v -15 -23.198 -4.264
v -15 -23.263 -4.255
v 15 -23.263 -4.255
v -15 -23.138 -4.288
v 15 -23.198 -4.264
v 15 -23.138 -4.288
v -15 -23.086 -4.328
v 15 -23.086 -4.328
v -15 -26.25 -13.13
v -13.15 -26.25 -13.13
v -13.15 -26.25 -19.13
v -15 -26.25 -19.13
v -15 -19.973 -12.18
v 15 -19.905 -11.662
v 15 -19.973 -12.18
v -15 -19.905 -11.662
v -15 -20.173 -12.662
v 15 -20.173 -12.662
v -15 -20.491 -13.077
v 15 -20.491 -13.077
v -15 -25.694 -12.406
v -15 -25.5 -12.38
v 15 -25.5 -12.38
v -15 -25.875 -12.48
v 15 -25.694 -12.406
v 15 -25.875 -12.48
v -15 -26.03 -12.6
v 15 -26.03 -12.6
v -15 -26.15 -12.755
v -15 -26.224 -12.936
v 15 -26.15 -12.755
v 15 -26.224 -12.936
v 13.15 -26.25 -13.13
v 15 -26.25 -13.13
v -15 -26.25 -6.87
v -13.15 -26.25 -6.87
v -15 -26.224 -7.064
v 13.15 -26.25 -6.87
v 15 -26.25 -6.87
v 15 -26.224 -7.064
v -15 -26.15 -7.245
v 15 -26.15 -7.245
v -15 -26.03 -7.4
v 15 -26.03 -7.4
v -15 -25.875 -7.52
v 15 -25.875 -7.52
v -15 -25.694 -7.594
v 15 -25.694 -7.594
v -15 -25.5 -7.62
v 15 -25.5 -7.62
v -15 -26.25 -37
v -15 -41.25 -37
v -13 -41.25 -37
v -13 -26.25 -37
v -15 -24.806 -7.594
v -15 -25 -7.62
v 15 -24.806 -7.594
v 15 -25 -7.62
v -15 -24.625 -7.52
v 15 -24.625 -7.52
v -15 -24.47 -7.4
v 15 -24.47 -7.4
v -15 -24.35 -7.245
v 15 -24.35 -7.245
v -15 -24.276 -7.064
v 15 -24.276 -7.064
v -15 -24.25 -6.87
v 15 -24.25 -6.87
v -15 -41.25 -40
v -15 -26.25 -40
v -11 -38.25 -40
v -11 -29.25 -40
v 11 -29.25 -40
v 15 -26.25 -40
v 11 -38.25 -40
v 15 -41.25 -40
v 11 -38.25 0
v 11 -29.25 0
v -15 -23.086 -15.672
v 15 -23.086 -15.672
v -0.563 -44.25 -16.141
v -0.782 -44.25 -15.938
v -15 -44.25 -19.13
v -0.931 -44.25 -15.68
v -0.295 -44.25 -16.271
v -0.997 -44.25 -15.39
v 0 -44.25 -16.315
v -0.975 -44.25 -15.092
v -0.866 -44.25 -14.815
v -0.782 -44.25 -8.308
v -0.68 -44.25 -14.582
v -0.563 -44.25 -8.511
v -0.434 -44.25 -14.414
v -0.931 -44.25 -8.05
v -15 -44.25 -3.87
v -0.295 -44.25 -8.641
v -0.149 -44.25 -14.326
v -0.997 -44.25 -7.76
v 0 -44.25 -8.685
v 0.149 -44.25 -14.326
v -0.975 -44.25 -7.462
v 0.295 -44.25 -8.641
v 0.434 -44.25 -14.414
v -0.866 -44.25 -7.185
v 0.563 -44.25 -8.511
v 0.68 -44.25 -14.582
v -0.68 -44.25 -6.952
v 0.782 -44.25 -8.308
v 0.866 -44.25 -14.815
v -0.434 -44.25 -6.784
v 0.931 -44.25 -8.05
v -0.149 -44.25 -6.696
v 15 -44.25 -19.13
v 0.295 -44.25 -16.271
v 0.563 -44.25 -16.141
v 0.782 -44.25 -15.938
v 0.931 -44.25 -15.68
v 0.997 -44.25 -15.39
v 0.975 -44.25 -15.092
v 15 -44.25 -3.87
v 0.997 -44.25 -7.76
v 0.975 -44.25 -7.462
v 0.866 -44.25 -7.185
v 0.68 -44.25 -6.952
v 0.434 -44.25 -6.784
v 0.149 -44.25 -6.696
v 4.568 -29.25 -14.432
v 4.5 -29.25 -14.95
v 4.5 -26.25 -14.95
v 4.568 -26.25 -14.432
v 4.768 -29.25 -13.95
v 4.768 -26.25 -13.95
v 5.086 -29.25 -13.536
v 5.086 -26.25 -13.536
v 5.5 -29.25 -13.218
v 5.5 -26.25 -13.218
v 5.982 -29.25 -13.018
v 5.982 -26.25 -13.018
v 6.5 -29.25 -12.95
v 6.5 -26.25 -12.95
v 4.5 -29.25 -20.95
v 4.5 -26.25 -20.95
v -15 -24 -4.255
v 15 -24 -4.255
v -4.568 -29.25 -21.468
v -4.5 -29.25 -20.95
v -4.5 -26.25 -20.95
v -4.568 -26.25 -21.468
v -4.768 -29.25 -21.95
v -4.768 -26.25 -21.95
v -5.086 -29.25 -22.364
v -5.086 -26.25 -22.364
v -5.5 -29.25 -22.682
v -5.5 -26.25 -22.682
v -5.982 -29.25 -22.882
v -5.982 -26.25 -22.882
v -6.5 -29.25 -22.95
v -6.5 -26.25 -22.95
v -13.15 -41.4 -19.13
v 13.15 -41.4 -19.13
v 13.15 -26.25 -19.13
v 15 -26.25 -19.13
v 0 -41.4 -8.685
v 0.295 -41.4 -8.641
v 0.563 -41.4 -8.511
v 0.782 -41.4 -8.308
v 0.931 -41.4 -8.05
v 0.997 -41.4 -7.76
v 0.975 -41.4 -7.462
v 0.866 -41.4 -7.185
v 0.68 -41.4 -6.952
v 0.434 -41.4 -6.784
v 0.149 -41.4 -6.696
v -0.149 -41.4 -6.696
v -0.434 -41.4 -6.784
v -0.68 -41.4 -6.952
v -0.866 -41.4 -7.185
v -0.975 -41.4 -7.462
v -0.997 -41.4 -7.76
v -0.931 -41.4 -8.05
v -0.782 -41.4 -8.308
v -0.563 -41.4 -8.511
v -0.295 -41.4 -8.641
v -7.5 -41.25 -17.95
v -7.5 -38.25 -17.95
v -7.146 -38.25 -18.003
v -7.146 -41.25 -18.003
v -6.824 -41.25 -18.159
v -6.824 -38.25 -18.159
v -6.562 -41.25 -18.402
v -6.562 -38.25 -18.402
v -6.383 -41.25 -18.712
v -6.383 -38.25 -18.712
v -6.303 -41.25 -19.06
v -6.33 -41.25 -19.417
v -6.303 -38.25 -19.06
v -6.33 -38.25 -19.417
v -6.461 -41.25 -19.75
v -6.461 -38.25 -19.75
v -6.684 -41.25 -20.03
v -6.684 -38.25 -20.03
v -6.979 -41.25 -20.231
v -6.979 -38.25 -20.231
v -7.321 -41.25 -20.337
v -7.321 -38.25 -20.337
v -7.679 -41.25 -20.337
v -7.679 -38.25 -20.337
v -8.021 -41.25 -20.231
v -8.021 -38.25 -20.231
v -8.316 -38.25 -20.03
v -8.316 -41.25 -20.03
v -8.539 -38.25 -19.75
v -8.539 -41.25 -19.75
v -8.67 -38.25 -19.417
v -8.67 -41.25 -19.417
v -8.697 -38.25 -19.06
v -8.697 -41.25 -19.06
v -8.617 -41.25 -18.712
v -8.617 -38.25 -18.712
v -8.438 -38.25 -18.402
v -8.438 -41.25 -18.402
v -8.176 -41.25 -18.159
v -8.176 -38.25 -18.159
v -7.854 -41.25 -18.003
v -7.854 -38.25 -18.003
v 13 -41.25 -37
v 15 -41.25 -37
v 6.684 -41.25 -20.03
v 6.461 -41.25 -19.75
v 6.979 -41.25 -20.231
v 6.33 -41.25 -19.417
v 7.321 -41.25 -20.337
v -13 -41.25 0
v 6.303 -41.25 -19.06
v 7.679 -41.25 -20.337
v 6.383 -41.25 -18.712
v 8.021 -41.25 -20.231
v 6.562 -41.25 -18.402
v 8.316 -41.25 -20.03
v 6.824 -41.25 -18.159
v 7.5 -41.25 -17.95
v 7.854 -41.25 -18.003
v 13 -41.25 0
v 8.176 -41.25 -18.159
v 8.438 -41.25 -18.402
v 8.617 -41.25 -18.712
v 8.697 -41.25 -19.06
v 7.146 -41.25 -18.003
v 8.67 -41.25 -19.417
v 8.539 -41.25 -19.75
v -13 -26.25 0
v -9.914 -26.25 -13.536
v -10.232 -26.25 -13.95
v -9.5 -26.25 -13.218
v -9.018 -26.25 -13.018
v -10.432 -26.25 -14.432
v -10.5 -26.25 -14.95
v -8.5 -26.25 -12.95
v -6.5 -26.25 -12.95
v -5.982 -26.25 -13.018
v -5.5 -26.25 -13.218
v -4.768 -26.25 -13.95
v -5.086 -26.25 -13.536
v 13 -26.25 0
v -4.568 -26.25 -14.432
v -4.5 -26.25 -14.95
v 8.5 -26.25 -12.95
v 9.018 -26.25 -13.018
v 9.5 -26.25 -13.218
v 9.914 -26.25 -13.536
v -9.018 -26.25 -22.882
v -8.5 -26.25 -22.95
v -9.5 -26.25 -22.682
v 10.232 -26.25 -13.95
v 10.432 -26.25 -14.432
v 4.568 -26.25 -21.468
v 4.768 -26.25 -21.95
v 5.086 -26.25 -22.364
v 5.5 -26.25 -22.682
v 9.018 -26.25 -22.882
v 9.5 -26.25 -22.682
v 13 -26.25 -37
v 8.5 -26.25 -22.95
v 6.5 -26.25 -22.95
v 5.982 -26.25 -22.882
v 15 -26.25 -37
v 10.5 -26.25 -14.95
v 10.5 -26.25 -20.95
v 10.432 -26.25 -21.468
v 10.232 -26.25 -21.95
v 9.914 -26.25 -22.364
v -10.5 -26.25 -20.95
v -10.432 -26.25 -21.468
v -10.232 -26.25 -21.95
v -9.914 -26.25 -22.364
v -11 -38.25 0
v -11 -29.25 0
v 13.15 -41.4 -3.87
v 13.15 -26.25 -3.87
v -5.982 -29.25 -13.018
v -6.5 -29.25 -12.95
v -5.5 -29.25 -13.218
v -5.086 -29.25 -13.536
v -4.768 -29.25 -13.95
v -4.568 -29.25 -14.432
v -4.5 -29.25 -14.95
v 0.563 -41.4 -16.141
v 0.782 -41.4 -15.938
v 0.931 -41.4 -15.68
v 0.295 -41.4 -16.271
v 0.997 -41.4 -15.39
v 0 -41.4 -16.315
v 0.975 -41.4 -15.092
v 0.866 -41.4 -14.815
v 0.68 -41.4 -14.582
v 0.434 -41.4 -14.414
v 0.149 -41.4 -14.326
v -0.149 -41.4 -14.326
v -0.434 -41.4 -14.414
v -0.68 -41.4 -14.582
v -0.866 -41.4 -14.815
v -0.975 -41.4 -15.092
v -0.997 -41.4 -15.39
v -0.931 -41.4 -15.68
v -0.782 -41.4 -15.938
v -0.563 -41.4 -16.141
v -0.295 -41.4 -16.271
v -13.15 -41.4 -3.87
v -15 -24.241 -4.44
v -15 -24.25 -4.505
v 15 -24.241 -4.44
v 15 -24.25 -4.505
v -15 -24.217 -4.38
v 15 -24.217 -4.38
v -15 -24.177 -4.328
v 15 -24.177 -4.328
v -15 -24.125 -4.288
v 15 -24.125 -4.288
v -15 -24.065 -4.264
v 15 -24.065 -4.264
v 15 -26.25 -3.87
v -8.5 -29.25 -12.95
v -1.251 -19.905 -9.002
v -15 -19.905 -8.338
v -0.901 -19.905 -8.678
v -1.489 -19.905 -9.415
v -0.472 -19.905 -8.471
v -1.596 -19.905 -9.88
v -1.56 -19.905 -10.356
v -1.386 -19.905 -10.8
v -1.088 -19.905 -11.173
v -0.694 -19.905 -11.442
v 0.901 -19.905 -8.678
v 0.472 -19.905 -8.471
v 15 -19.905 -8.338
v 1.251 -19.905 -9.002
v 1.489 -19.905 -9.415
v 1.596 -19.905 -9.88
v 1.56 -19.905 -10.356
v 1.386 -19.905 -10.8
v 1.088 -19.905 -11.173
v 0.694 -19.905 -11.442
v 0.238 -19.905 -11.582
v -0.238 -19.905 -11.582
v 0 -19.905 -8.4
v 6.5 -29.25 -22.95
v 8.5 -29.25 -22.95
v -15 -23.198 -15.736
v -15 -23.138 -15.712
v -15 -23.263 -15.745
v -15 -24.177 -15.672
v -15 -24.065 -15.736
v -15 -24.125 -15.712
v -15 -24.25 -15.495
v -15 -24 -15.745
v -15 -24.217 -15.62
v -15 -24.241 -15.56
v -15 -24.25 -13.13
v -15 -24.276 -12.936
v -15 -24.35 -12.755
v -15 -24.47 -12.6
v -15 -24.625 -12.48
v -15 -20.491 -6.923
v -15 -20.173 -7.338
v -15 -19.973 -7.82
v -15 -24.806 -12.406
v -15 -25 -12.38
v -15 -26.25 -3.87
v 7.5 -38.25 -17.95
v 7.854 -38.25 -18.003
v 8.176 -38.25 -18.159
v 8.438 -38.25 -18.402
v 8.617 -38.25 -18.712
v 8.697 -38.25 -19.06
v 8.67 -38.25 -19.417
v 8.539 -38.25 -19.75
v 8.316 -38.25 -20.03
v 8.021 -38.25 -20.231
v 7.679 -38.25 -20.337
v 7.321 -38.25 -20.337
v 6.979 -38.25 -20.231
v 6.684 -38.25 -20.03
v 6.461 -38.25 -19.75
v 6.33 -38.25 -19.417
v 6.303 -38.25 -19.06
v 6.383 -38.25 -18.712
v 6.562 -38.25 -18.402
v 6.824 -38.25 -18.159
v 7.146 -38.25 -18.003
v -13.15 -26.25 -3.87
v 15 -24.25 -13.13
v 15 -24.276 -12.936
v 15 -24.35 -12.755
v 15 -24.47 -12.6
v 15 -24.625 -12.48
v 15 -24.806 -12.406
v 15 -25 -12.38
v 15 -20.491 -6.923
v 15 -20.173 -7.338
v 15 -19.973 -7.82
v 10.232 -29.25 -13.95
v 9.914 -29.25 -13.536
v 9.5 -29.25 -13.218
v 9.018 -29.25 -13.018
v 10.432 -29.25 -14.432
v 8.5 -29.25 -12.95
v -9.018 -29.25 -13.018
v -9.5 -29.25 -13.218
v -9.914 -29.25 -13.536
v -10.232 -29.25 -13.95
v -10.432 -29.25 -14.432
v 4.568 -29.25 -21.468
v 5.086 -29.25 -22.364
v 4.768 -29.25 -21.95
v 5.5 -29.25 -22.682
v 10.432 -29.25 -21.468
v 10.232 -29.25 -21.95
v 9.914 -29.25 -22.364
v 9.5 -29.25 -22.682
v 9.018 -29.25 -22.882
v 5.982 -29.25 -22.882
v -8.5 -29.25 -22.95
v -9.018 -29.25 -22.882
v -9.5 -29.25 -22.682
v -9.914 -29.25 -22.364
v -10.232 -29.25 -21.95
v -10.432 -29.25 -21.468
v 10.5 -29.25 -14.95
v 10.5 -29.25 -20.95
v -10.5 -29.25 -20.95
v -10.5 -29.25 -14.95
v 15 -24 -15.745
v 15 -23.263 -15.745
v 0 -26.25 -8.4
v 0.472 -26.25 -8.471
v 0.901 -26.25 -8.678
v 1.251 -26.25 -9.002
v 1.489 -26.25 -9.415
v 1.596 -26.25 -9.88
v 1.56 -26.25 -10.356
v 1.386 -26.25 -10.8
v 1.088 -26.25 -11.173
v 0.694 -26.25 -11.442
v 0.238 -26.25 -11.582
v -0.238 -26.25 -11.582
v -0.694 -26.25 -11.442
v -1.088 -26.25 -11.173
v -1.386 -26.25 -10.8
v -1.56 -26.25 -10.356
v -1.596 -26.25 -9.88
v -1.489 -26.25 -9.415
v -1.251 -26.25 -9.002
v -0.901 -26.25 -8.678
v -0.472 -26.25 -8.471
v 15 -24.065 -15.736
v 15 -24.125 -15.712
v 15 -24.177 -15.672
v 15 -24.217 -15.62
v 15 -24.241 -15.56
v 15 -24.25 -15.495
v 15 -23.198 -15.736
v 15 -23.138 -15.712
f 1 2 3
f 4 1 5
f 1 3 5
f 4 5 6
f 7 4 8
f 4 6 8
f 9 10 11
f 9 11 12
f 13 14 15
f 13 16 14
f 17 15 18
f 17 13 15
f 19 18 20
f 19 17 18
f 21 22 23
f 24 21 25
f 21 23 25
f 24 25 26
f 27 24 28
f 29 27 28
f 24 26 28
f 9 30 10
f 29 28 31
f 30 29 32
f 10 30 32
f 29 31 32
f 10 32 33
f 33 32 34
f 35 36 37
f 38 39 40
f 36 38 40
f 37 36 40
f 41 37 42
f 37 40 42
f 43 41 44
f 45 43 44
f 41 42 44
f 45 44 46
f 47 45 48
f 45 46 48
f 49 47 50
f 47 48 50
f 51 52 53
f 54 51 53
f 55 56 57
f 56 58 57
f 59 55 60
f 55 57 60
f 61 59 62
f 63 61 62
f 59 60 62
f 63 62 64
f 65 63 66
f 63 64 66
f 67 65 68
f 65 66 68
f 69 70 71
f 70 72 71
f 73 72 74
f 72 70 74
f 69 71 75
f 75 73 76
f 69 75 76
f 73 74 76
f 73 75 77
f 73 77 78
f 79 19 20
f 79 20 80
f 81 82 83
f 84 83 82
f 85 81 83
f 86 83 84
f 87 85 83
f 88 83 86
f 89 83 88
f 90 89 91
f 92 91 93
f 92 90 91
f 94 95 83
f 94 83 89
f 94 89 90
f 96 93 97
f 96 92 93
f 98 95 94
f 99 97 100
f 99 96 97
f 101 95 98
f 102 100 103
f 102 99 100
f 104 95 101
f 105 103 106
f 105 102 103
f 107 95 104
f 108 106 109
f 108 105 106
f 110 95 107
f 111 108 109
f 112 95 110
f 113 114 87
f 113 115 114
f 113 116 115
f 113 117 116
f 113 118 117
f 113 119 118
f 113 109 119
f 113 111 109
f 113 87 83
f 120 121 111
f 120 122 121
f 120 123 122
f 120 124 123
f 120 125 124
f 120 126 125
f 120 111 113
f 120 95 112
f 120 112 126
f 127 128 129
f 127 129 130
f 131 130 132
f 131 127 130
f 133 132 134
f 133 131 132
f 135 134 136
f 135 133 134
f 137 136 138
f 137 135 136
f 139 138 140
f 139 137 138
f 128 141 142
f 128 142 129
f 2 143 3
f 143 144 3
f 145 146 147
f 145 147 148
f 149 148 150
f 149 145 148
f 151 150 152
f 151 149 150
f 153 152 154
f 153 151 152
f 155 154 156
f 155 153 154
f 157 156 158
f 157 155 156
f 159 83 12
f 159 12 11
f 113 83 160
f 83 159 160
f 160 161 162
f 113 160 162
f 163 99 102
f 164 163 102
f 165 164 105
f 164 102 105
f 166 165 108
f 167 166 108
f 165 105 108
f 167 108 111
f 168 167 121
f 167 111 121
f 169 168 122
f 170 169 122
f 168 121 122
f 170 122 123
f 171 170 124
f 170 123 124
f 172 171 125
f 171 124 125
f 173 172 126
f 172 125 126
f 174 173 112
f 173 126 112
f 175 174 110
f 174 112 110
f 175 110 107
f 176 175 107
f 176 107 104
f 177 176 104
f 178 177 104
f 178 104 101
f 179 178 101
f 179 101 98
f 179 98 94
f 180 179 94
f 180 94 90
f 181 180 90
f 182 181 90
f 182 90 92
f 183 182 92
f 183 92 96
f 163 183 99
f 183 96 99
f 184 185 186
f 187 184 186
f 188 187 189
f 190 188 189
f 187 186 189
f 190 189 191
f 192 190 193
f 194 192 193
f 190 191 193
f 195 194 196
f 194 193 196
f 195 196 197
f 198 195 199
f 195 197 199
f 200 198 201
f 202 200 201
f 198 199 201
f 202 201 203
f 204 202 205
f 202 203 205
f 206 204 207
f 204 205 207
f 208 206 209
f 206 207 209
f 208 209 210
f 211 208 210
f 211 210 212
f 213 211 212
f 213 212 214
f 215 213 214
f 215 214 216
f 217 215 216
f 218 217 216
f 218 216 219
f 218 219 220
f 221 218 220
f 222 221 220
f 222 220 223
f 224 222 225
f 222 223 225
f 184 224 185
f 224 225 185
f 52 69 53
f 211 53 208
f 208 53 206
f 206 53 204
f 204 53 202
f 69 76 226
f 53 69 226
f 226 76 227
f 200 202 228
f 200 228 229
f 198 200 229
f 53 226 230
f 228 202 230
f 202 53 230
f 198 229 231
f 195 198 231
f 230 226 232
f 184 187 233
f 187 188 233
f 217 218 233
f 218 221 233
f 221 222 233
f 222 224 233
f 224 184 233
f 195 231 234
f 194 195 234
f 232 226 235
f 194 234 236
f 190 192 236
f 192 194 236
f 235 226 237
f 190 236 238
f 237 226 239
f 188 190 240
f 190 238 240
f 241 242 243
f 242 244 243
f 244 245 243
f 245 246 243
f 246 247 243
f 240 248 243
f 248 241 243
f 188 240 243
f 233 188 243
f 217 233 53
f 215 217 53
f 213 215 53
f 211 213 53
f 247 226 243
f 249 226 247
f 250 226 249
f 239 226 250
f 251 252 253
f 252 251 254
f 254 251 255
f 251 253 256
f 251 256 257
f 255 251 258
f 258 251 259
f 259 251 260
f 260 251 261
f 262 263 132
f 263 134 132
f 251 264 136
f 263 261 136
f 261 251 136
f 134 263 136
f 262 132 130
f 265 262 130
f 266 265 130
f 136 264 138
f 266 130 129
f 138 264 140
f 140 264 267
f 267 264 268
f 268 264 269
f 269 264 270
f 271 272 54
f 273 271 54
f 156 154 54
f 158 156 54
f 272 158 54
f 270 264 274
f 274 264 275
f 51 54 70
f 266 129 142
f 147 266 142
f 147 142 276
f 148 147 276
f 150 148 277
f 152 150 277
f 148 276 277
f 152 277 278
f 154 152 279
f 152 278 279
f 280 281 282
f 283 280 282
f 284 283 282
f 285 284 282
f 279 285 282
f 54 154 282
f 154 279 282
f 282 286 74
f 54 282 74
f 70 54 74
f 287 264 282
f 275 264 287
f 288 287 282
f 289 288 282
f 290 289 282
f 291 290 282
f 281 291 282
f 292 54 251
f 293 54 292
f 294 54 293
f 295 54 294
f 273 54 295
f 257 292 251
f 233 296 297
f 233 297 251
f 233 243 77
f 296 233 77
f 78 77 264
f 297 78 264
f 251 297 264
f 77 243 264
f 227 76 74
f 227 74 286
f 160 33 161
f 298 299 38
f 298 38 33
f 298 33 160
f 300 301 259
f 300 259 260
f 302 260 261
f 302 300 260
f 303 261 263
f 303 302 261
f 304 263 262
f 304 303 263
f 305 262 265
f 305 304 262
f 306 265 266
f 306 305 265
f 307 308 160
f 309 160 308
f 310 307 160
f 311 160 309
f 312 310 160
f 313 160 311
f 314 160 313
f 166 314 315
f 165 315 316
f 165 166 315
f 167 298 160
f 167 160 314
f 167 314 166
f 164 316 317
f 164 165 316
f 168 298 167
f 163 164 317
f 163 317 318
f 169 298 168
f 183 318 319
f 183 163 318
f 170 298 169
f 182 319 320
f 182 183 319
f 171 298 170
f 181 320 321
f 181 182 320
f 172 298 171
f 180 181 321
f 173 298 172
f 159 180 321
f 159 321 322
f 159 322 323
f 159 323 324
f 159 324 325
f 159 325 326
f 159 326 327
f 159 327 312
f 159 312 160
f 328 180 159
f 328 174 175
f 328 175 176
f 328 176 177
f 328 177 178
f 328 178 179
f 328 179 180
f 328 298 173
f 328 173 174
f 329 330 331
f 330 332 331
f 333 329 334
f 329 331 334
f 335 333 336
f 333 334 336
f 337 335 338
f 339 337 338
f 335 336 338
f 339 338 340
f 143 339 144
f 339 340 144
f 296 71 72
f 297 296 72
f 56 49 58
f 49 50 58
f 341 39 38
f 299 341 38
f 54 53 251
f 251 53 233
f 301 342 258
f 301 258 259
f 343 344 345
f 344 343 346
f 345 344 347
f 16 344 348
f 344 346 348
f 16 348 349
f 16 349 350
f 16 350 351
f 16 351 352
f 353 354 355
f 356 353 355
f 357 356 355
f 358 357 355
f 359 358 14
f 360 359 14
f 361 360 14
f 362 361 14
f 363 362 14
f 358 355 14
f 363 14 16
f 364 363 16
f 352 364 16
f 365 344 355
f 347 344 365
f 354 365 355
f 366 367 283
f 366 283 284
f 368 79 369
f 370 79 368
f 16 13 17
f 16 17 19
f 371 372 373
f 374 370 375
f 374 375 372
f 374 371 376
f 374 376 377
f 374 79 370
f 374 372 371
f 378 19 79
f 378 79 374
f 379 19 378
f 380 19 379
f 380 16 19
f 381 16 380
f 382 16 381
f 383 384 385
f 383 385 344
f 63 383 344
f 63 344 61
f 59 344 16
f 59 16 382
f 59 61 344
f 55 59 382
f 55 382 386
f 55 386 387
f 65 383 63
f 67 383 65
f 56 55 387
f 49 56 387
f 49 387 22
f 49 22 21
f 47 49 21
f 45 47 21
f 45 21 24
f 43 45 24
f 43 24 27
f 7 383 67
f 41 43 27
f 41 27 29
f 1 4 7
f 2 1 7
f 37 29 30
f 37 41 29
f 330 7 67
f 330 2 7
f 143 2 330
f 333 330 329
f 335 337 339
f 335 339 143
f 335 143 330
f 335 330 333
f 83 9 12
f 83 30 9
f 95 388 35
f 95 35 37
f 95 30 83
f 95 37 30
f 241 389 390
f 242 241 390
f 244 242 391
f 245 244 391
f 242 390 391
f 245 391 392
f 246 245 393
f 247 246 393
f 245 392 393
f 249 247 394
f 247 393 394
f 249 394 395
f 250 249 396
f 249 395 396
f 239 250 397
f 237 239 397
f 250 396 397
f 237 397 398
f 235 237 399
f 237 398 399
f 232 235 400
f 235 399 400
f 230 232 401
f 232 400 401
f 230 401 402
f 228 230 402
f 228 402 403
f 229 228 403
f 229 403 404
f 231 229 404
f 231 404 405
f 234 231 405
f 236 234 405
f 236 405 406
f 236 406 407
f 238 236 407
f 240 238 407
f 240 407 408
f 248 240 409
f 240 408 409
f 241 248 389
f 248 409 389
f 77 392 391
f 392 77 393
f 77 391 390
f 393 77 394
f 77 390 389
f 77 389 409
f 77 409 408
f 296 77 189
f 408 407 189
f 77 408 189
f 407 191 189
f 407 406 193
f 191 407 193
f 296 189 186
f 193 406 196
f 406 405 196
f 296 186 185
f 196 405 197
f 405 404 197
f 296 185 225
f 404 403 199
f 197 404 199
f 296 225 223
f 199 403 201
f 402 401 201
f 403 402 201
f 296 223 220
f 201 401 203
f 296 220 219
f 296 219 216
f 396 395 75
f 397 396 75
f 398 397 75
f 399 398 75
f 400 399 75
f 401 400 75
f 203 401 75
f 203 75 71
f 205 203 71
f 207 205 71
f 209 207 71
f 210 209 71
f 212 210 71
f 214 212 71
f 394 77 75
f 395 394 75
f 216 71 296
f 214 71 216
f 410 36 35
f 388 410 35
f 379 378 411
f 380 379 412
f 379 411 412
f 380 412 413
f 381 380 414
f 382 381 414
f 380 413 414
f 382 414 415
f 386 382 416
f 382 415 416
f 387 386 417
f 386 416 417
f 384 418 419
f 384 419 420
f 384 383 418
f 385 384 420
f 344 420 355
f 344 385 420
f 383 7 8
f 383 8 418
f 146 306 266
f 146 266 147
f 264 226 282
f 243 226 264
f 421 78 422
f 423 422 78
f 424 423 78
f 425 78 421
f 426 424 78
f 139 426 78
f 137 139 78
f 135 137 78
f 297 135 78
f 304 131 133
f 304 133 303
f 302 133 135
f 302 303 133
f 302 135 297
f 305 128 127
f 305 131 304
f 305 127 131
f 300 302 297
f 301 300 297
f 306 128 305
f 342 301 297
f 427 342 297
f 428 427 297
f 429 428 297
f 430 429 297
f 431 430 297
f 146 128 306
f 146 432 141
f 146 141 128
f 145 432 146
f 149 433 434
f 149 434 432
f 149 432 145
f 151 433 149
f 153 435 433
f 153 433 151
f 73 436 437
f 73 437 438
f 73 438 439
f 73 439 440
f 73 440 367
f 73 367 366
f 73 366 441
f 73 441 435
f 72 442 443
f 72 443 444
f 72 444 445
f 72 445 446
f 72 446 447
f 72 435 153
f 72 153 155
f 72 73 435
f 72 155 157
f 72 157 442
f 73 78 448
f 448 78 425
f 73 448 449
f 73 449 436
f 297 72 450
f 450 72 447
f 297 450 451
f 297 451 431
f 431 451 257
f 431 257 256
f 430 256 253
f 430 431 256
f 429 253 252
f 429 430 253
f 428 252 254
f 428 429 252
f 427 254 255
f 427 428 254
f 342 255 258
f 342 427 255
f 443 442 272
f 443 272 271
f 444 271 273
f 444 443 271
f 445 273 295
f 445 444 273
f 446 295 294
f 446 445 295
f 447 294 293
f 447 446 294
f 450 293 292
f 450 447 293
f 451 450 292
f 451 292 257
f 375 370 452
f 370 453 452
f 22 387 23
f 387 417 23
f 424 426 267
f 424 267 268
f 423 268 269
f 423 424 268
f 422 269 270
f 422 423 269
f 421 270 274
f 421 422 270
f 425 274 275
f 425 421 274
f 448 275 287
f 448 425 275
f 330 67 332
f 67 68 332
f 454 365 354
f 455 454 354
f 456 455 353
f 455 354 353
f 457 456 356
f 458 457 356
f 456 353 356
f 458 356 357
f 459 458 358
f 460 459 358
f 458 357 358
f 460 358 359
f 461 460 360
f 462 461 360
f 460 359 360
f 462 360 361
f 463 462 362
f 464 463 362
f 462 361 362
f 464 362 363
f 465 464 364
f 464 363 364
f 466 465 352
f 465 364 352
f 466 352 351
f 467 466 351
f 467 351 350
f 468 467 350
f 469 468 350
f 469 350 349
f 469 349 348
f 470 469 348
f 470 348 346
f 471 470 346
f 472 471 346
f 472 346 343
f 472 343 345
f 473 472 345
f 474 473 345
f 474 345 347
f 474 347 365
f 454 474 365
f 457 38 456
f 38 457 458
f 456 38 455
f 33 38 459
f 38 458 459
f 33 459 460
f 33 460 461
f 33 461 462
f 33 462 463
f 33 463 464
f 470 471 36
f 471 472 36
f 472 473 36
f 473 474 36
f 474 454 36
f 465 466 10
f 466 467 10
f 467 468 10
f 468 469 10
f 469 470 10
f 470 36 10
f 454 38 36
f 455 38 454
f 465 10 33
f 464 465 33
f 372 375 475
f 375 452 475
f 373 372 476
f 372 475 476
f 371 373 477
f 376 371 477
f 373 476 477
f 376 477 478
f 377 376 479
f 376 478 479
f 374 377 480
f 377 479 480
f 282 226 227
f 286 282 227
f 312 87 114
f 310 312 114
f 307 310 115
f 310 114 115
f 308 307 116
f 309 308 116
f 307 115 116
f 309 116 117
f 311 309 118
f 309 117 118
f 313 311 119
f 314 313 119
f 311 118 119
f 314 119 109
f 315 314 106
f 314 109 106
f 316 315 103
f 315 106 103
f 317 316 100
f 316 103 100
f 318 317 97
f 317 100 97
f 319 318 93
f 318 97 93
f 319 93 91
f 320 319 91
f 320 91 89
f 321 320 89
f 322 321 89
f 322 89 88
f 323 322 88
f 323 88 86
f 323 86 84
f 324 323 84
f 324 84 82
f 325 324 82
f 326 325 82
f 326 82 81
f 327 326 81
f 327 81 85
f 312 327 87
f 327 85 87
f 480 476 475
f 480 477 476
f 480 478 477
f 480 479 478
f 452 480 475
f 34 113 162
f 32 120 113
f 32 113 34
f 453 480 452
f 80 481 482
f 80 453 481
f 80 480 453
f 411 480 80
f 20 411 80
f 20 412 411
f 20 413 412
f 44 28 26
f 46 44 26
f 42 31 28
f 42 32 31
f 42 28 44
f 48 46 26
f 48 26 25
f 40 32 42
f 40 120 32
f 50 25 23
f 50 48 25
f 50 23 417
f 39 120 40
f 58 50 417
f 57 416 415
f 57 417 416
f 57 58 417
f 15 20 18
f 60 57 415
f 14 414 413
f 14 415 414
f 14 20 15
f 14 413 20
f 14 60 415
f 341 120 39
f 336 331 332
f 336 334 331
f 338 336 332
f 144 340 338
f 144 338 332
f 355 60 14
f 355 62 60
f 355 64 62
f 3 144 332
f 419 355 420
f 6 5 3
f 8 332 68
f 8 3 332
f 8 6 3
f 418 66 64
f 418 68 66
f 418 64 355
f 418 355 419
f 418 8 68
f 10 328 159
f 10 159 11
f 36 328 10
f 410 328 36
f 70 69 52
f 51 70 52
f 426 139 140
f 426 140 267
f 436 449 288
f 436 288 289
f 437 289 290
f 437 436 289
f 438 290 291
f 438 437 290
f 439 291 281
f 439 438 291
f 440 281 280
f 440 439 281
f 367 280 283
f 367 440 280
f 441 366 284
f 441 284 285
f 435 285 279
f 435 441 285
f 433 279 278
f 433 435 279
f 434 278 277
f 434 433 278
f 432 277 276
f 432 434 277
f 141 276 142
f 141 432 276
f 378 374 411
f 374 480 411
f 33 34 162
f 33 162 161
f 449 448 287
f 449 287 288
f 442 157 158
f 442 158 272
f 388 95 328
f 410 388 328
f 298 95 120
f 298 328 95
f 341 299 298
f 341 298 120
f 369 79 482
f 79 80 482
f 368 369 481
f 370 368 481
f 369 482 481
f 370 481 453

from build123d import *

# Parameters (mm, degrees)
BOSS_EXTRUDE1_DEPTH    = 15
SKETCH2_W              = 22
SKETCH2_H              = 9
CUT_EXTRUDE1_DEPTH     = 60.384867601
SKETCH4_R              = 1.2
CUT_EXTRUDE3_DEPTH     = 3
FILLET1_R              = 2
SPLIT1_SURFACE_1_BACK  = 55.366
SPLIT1_SURFACE_1_DEPTH = 110.732
SPLIT1_SURFACE_2_BACK  = 55.366
SPLIT1_SURFACE_2_DEPTH = 110.732
CUT_EXTRUDE2_START     = -29.25
CUT_EXTRUDE2_DEPTH     = 3
SKETCH6_R              = 1.6
CUT_EXTRUDE4_DEPTH     = 48.755722432
SKETCH10_W             = 2
SKETCH10_H             = 37
CUT_EXTRUDE6_DEPTH     = 15
BOSS_EXTRUDE2_START    = -6.87
BOSS_EXTRUDE2_DEPTH    = 6.26
BOSS_EXTRUDE4_DEPTH    = 3
BOSS_EXTRUDE5_START    = -6.26
BOSS_EXTRUDE5_DEPTH    = 6
SKETCH12_R             = 1
CUT_EXTRUDE7_DEPTH     = 2.85


with BuildPart() as part:
    # Sketch1 → Boss-Extrude1 (new, symmetric)
    with BuildSketch(Plane(origin=(0, 0, 0), x_dir=(0, 0, -1), z_dir=(1, 0, 0))):
        with BuildLine():
            Line((19.5, -26.25), (40, -26.25))
            Line((40, -26.25), (40, -41.25))
            Line((40, -41.25), (0, -41.25))
            Line((0, -41.25), (0, -26.25))
            Line((0, -26.25), (0.5, -26.25))
            Line((0.5, -26.25), (6.87, -26.25))
            ThreePointArc((6.87, -26.25), (7.400330086, -26.030330086), (7.62, -25.5))
            Line((7.62, -25.5), (7.62, -25))
            ThreePointArc((7.62, -25), (7.400330086, -24.469669914), (6.87, -24.25))
            Line((6.87, -24.25), (4.505, -24.25))
            ThreePointArc((4.505, -24.25), (4.328223305, -24.176776695), (4.255, -24))
            Line((4.255, -24), (4.255, -23.262766953))
            ThreePointArc((4.255, -23.262766953), (4.274030117, -23.167096095), (4.328223305, -23.085990258))
            Line((4.328223305, -23.085990258), (7.509213562, -19.905))
            Line((7.509213562, -19.905), (12.490786438, -19.905))
            Line((12.490786438, -19.905), (15.671776695, -23.085990258))
            ThreePointArc((15.671776695, -23.085990258), (15.725969883, -23.167096095), (15.745, -23.262766953))
            Line((15.745, -23.262766953), (15.745, -24))
            ThreePointArc((15.745, -24), (15.671776695, -24.176776695), (15.495, -24.25))
            Line((15.495, -24.25), (13.13, -24.25))
            ThreePointArc((13.13, -24.25), (12.599669914, -24.469669914), (12.38, -25))
            Line((12.38, -25), (12.38, -25.5))
            ThreePointArc((12.38, -25.5), (12.599669914, -26.030330086), (13.13, -26.25))
            Line((13.13, -26.25), (19.5, -26.25))
        make_face()
    extrude(amount=BOSS_EXTRUDE1_DEPTH, both=True)

    # Sketch2 → Cut-Extrude1 (cut, through all)
    with BuildSketch(Plane(origin=(0, 0, -40), x_dir=(-1, 0, 0), z_dir=(0, 0, -1))):
        with Locations((0, -33.75)):
            Rectangle(SKETCH2_W, SKETCH2_H)
    extrude(amount=-CUT_EXTRUDE1_DEPTH, mode=Mode.SUBTRACT)

    # Sketch4 → Cut-Extrude3 (cut)
    with BuildSketch(Plane(origin=(0, -38.25, 0), x_dir=(1, 0, 0), z_dir=(0, 1, 0))):
        with Locations(Location((-7.5, 19.15, 0), (0, 0, 270))):
            Circle(SKETCH4_R)
        with Locations(Location((7.5, 19.15, 0), (0, 0, 270))):
            Circle(SKETCH4_R)
    extrude(amount=-CUT_EXTRUDE3_DEPTH, mode=Mode.SUBTRACT)

    # Fillet1
    fillet1_edges = [part.edges().sort_by_distance(p)[0] for p in [
        (0, -19.905, -7.509213562),
        (0, -19.905, -12.490786438),
    ]]
    fillet(fillet1_edges, radius=FILLET1_R)


with BuildPart() as body_2:
    # Split1: the piece behind the surface
    add(part.part)
    # Split1 surface: a surface, the sketch's curves swept straight by 110.732 mm
    with BuildLine(Plane(origin=(15, 0, 0), x_dir=(0, 0, -1), z_dir=(1, 0, 0)).offset(-SPLIT1_SURFACE_1_BACK), mode=Mode.PRIVATE) as split1_surface_1_path:
        Line((0, -26.25), (40, -26.25))
    split1_surface_1 = Shell.extrude(split1_surface_1_path.wire(), (1 * SPLIT1_SURFACE_1_DEPTH, 0 * SPLIT1_SURFACE_1_DEPTH, 0 * SPLIT1_SURFACE_1_DEPTH))
    split(bisect_by=split1_surface_1, keep=Keep.BOTTOM)

    # Sketch3 → Cut-Extrude2 (cut)
    with BuildSketch(Plane(origin=(0, 0, 0), x_dir=(1, 0, 0), z_dir=(0, 1, 0)).offset(CUT_EXTRUDE2_START)):
        with BuildLine():
            Line((-10.5, 20.95), (-10.5, 14.95))
            ThreePointArc((-10.5, 14.95), (-9.914213562, 13.535786438), (-8.5, 12.95))
            Line((-8.5, 12.95), (-6.5, 12.95))
            ThreePointArc((-6.5, 12.95), (-5.085786438, 13.535786438), (-4.5, 14.95))
            Line((-4.5, 14.95), (-4.5, 20.95))
            ThreePointArc((-4.5, 20.95), (-5.085786438, 22.364213562), (-6.5, 22.95))
            Line((-6.5, 22.95), (-8.5, 22.95))
            ThreePointArc((-8.5, 22.95), (-9.914213562, 22.364213562), (-10.5, 20.95))
        make_face()
        with BuildLine():
            Line((10.5, 14.95), (10.5, 20.95))
            ThreePointArc((10.5, 20.95), (9.914213562, 22.364213562), (8.5, 22.95))
            Line((8.5, 22.95), (6.5, 22.95))
            ThreePointArc((6.5, 22.95), (5.085786438, 22.364213562), (4.5, 20.95))
            Line((4.5, 20.95), (4.5, 14.95))
            ThreePointArc((4.5, 14.95), (5.085786438, 13.535786438), (6.5, 12.95))
            Line((6.5, 12.95), (8.5, 12.95))
            ThreePointArc((8.5, 12.95), (9.914213562, 13.535786438), (10.5, 14.95))
        make_face()
    extrude(amount=CUT_EXTRUDE2_DEPTH, mode=Mode.SUBTRACT)

    # Sketch10 → Cut-Extrude6 (cut)
    with BuildSketch(Plane.XZ.offset(41.25)):
        with Locations((-14, -18.5)):
            Rectangle(SKETCH10_W, SKETCH10_H)
        with Locations((14, -18.5)):
            Rectangle(SKETCH10_W, SKETCH10_H)
    extrude(amount=-CUT_EXTRUDE6_DEPTH, mode=Mode.SUBTRACT)


with BuildPart() as part_1:
    add(part.part)

    # Split1: split by a surface, the side it looks to stays
    # Split1 surface: a surface, the sketch's curves swept straight by 110.732 mm
    with BuildLine(Plane(origin=(15, 0, 0), x_dir=(0, 0, -1), z_dir=(1, 0, 0)).offset(-SPLIT1_SURFACE_2_BACK), mode=Mode.PRIVATE) as split1_surface_2_path:
        Line((0, -26.25), (40, -26.25))
    split1_surface_2 = Shell.extrude(split1_surface_2_path.wire(), (1 * SPLIT1_SURFACE_2_DEPTH, 0 * SPLIT1_SURFACE_2_DEPTH, 0 * SPLIT1_SURFACE_2_DEPTH))
    split(bisect_by=split1_surface_2, keep=Keep.TOP)

    # Sketch6 → Cut-Extrude4 (cut, through all)
    with BuildSketch(Plane(origin=(0, -19.905, 0), x_dir=(1, 0, 0), z_dir=(0, 1, 0))):
        with Locations(Location((0, 10, 0), (0, 0, 270))):
            Circle(SKETCH6_R)
    extrude(amount=-CUT_EXTRUDE4_DEPTH, mode=Mode.SUBTRACT)

    # Sketch11 → Boss-Extrude2 (add)
    with BuildSketch(Plane.XY.offset(BOSS_EXTRUDE2_START)):
        Polygon((-13.15, -26.25), (-15, -26.25), (-15, -44.25), (15, -44.25), (15, -26.25), (13.15, -26.25), (13.15, -41.4), (-13.15, -41.4), align=None)
    extrude(amount=-BOSS_EXTRUDE2_DEPTH)

    # Sketch13 → Boss-Extrude4 (add)
    with BuildSketch(Plane.XY.offset(-6.87)):
        Polygon((13.15, -26.25), (13.15, -41.4), (-13.15, -41.4), (-13.15, -26.25), (-15, -26.25), (-15, -44.25), (15, -44.25), (15, -26.25), align=None)
    extrude(amount=BOSS_EXTRUDE4_DEPTH)

    # Sketch13<2> → Boss-Extrude5 (add)
    with BuildSketch(Plane.XY.offset(-6.87).offset(BOSS_EXTRUDE5_START)):
        Polygon((13.15, -26.25), (13.15, -41.4), (-13.15, -41.4), (-13.15, -26.25), (-15, -26.25), (-15, -44.25), (15, -44.25), (15, -26.25), align=None)
    extrude(amount=-BOSS_EXTRUDE5_DEPTH)

    # Sketch12 → Cut-Extrude7 (cut)
    with BuildSketch(Plane.XZ.offset(44.25)):
        with Locations(Location((0, -7.685, 0), (0, 0, 270))):
            Circle(SKETCH12_R)
        with Locations(Location((0, -15.315, 0), (0, 0, 270))):
            Circle(SKETCH12_R)
    extrude(amount=-CUT_EXTRUDE7_DEPTH, mode=Mode.SUBTRACT)


solid = Compound([body_2.part, part_1.part])
